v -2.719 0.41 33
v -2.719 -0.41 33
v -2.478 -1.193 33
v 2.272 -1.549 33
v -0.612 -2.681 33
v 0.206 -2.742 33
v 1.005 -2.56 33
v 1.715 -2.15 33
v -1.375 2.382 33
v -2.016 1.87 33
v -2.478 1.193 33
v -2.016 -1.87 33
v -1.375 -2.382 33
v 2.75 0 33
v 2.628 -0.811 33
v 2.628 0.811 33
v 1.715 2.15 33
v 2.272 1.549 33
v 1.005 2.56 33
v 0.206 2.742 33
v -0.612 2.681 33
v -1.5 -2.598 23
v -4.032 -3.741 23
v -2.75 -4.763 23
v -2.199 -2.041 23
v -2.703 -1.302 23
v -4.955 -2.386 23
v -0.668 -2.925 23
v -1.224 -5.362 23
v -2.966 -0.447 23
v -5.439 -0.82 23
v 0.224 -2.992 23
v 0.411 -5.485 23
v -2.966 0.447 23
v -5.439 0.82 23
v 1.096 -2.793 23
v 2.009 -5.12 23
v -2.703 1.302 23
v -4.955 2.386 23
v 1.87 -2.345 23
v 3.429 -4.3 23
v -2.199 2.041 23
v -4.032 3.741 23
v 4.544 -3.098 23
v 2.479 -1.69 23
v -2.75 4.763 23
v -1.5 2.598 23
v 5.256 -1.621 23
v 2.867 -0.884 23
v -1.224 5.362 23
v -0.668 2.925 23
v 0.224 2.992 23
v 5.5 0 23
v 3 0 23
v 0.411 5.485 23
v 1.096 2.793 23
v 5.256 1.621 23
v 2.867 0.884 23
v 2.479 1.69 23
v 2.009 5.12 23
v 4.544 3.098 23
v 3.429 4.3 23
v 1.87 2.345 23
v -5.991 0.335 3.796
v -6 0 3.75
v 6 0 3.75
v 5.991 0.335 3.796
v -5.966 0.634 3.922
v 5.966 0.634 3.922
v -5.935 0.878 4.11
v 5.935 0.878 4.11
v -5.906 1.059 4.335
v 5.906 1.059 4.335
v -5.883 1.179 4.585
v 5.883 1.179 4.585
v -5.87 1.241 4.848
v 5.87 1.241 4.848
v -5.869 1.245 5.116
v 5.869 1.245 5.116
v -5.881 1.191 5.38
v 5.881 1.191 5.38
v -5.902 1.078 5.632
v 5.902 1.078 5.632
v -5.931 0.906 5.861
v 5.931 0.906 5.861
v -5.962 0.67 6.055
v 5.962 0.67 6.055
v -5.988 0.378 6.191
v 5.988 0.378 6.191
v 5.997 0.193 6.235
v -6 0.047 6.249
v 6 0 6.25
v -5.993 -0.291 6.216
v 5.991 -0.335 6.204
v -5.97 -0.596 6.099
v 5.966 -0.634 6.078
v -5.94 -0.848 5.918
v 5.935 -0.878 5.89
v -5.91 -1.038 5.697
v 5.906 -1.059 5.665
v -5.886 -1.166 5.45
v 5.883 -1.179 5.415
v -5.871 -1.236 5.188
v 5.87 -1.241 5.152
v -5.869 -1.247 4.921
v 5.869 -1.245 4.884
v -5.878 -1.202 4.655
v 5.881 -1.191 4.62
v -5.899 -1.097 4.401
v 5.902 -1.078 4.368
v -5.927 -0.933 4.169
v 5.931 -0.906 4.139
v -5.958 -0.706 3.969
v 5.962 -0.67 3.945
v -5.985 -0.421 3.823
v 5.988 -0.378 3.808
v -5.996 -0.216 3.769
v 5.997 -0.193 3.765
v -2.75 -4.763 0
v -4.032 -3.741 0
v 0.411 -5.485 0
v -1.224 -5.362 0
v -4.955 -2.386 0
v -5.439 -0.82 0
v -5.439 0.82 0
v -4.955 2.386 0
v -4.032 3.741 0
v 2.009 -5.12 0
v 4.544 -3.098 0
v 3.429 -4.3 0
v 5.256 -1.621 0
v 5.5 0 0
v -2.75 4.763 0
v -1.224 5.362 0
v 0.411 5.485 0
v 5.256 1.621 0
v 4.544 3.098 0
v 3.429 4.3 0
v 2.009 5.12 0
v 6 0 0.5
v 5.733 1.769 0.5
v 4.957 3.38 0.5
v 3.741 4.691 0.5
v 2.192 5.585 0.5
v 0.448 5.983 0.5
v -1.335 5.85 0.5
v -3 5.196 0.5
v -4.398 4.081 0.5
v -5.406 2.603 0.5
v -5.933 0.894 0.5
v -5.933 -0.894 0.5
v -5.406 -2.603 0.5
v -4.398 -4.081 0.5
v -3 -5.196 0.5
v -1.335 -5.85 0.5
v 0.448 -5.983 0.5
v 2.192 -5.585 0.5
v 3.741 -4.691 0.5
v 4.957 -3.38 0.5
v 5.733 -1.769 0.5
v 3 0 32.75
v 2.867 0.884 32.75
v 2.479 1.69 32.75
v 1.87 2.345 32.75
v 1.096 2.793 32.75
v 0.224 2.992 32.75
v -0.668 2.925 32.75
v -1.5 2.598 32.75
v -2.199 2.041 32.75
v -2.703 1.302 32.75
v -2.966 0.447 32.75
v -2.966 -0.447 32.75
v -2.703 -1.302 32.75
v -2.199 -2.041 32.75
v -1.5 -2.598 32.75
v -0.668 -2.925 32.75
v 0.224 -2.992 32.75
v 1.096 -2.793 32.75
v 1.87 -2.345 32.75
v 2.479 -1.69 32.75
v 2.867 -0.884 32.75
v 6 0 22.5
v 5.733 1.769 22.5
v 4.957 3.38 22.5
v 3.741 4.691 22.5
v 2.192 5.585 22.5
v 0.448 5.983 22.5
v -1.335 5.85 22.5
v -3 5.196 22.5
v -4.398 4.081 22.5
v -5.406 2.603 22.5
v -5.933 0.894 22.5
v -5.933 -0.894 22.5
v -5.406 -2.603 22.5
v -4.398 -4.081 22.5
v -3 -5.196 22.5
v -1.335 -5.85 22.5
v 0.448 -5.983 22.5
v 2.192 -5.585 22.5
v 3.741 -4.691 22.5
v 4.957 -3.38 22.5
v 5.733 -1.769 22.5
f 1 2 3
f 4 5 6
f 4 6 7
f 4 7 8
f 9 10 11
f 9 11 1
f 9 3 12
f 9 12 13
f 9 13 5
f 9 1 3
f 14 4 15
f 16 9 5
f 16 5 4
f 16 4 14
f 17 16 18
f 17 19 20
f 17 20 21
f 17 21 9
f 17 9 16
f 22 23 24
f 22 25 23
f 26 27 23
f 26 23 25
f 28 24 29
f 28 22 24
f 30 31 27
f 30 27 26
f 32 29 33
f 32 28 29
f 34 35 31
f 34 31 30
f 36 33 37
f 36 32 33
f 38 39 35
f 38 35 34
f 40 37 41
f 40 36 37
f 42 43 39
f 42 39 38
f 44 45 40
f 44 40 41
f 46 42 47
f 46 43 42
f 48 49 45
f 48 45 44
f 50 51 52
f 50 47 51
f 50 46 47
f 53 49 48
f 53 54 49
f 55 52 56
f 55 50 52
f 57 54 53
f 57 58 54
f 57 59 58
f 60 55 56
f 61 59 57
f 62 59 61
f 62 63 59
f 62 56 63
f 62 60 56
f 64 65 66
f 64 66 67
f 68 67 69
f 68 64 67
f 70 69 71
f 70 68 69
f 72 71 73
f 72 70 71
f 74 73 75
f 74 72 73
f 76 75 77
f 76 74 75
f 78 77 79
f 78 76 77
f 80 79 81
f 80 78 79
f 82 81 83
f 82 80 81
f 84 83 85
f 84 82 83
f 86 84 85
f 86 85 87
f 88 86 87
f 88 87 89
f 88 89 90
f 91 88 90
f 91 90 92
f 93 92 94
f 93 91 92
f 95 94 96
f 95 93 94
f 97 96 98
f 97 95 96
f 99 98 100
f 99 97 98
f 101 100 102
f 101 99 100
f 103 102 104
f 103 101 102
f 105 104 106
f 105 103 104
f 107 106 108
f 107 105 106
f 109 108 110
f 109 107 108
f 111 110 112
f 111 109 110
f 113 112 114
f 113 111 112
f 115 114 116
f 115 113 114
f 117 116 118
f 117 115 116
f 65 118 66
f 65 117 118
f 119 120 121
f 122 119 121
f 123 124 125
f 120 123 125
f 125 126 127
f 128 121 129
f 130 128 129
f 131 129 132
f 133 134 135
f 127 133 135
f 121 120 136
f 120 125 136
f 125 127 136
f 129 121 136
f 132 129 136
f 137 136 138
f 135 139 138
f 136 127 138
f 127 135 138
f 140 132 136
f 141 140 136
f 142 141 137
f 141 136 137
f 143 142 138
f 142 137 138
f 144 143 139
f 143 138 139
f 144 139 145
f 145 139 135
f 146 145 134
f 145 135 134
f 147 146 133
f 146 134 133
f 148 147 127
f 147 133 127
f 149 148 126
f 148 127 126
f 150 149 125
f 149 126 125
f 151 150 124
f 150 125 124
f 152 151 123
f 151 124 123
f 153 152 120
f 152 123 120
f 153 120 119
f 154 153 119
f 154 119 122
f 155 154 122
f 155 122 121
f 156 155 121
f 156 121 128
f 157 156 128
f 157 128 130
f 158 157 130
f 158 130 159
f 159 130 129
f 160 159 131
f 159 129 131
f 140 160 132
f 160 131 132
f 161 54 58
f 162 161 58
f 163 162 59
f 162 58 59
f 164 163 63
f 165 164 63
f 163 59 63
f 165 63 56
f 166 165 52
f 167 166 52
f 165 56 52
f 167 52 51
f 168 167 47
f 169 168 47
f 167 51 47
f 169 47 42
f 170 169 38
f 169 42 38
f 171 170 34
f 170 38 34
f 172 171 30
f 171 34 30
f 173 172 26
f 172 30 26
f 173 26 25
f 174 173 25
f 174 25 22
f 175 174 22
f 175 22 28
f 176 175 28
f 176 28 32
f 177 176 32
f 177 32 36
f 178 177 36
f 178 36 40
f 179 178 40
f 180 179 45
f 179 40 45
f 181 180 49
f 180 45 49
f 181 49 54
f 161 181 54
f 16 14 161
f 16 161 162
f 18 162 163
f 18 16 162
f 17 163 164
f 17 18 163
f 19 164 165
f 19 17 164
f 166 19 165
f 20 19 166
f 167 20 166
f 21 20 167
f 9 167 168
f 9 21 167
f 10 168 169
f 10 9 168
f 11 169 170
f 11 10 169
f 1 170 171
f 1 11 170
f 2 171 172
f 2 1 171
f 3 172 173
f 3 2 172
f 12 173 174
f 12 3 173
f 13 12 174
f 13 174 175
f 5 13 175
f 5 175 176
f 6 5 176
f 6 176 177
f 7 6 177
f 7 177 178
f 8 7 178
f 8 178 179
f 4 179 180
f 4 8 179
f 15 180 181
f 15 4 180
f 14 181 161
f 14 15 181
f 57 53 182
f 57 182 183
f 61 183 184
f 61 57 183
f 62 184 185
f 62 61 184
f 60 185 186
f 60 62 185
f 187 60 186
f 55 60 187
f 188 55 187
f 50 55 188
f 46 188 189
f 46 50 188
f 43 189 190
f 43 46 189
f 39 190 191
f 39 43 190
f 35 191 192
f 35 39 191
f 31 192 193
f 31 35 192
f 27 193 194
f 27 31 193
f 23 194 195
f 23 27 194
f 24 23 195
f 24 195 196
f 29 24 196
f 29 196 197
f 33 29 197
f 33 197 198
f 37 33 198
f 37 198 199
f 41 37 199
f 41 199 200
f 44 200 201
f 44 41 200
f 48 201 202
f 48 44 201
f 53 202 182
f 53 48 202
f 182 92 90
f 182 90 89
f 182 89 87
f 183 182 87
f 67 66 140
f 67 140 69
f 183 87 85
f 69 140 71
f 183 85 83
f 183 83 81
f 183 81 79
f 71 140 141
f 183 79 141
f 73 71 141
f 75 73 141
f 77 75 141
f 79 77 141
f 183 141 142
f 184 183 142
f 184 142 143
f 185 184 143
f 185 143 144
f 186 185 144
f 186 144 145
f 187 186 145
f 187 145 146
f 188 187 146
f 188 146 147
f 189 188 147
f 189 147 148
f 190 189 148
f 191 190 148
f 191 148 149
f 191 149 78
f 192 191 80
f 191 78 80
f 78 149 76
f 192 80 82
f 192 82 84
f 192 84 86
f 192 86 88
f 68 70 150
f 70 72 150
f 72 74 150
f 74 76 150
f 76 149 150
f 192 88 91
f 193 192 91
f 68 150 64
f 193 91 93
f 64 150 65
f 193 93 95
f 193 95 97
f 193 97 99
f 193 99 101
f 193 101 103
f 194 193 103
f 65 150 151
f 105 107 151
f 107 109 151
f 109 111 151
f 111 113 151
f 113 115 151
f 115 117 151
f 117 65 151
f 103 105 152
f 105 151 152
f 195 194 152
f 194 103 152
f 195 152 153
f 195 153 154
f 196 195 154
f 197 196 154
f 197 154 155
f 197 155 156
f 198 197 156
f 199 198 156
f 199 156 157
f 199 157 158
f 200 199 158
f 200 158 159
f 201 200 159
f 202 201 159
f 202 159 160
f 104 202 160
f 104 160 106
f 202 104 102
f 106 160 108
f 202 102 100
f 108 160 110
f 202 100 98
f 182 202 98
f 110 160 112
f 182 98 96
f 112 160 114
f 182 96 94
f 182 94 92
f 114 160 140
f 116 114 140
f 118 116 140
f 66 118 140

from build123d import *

# Parameters (mm, degrees)
SKETCH1_R               = 6
BOSS_EXTRUDE1_DEPTH     = 23
SKETCH2_R               = 3
BOSS_EXTRUDE2_DEPTH     = 10
CHAMFER1_SIZE           = 0.5
CHAMFER2_SIZE           = 0.25
CUT_EXTRUDE1_DEPTH      = 35.073450075
CUT_EXTRUDE1_DEPTH_BACK = 35.073450075
SKETCH4_R               = 1.25


with BuildPart() as part:
    # Sketch1 → Boss-Extrude1 (new body)
    with BuildSketch(Plane.XY):
        Circle(SKETCH1_R)
    extrude(amount=BOSS_EXTRUDE1_DEPTH)

    # Sketch2 → Boss-Extrude2 (add)
    with BuildSketch(Plane.XY.offset(23)):
        Circle(SKETCH2_R)
    extrude(amount=BOSS_EXTRUDE2_DEPTH)

    # Chamfer1
    chamfer1_edges = [part.edges().sort_by_distance(p)[0] for p in [
        (-6, 0, 0),
        (-6, 0, 23),
    ]]
    chamfer(chamfer1_edges, length=CHAMFER1_SIZE)

    # Chamfer2
    chamfer2_edges = [part.edges().sort_by_distance(p)[0] for p in [
        (-3, 0, 33),
    ]]
    chamfer(chamfer2_edges, length=CHAMFER2_SIZE)

    # Sketch4 → Cut-Extrude1 (cut, two sides: drawn at the far end of the back side and taken through both)
    with BuildSketch(Plane(origin=(0, 0, 0), x_dir=(0, 0, -1), z_dir=(1, 0, 0)).offset(-CUT_EXTRUDE1_DEPTH_BACK)):
        with Locations((-5, 0)):
            Circle(SKETCH4_R)
    extrude(amount=CUT_EXTRUDE1_DEPTH + CUT_EXTRUDE1_DEPTH_BACK, mode=Mode.SUBTRACT)


solid = part.part
